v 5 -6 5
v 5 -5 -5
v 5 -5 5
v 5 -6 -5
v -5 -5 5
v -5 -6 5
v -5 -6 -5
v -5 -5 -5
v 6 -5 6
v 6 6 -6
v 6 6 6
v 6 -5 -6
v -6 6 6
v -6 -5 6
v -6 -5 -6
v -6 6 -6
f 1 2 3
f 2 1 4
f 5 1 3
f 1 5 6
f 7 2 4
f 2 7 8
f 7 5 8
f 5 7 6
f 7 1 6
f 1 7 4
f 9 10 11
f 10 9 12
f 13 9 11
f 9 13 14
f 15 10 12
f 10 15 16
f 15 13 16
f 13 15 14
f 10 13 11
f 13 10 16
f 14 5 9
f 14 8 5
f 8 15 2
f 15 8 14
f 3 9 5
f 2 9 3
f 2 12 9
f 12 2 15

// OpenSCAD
// Unit of length: Unit.MM
union()
{
   color(c = [1.0, 0.0, 0.0, 1.0])
   {
      translate(v = [0.0, -0.5, 0.0])
      {
         cube(size = [10.0, 11.0, 10.0], center = true);
      }
   }
   translate(v = [0.0, 0.5, 0.0])
   {
      cube(size = [12.0, 11.0, 12.0], center = true);
   }
}
